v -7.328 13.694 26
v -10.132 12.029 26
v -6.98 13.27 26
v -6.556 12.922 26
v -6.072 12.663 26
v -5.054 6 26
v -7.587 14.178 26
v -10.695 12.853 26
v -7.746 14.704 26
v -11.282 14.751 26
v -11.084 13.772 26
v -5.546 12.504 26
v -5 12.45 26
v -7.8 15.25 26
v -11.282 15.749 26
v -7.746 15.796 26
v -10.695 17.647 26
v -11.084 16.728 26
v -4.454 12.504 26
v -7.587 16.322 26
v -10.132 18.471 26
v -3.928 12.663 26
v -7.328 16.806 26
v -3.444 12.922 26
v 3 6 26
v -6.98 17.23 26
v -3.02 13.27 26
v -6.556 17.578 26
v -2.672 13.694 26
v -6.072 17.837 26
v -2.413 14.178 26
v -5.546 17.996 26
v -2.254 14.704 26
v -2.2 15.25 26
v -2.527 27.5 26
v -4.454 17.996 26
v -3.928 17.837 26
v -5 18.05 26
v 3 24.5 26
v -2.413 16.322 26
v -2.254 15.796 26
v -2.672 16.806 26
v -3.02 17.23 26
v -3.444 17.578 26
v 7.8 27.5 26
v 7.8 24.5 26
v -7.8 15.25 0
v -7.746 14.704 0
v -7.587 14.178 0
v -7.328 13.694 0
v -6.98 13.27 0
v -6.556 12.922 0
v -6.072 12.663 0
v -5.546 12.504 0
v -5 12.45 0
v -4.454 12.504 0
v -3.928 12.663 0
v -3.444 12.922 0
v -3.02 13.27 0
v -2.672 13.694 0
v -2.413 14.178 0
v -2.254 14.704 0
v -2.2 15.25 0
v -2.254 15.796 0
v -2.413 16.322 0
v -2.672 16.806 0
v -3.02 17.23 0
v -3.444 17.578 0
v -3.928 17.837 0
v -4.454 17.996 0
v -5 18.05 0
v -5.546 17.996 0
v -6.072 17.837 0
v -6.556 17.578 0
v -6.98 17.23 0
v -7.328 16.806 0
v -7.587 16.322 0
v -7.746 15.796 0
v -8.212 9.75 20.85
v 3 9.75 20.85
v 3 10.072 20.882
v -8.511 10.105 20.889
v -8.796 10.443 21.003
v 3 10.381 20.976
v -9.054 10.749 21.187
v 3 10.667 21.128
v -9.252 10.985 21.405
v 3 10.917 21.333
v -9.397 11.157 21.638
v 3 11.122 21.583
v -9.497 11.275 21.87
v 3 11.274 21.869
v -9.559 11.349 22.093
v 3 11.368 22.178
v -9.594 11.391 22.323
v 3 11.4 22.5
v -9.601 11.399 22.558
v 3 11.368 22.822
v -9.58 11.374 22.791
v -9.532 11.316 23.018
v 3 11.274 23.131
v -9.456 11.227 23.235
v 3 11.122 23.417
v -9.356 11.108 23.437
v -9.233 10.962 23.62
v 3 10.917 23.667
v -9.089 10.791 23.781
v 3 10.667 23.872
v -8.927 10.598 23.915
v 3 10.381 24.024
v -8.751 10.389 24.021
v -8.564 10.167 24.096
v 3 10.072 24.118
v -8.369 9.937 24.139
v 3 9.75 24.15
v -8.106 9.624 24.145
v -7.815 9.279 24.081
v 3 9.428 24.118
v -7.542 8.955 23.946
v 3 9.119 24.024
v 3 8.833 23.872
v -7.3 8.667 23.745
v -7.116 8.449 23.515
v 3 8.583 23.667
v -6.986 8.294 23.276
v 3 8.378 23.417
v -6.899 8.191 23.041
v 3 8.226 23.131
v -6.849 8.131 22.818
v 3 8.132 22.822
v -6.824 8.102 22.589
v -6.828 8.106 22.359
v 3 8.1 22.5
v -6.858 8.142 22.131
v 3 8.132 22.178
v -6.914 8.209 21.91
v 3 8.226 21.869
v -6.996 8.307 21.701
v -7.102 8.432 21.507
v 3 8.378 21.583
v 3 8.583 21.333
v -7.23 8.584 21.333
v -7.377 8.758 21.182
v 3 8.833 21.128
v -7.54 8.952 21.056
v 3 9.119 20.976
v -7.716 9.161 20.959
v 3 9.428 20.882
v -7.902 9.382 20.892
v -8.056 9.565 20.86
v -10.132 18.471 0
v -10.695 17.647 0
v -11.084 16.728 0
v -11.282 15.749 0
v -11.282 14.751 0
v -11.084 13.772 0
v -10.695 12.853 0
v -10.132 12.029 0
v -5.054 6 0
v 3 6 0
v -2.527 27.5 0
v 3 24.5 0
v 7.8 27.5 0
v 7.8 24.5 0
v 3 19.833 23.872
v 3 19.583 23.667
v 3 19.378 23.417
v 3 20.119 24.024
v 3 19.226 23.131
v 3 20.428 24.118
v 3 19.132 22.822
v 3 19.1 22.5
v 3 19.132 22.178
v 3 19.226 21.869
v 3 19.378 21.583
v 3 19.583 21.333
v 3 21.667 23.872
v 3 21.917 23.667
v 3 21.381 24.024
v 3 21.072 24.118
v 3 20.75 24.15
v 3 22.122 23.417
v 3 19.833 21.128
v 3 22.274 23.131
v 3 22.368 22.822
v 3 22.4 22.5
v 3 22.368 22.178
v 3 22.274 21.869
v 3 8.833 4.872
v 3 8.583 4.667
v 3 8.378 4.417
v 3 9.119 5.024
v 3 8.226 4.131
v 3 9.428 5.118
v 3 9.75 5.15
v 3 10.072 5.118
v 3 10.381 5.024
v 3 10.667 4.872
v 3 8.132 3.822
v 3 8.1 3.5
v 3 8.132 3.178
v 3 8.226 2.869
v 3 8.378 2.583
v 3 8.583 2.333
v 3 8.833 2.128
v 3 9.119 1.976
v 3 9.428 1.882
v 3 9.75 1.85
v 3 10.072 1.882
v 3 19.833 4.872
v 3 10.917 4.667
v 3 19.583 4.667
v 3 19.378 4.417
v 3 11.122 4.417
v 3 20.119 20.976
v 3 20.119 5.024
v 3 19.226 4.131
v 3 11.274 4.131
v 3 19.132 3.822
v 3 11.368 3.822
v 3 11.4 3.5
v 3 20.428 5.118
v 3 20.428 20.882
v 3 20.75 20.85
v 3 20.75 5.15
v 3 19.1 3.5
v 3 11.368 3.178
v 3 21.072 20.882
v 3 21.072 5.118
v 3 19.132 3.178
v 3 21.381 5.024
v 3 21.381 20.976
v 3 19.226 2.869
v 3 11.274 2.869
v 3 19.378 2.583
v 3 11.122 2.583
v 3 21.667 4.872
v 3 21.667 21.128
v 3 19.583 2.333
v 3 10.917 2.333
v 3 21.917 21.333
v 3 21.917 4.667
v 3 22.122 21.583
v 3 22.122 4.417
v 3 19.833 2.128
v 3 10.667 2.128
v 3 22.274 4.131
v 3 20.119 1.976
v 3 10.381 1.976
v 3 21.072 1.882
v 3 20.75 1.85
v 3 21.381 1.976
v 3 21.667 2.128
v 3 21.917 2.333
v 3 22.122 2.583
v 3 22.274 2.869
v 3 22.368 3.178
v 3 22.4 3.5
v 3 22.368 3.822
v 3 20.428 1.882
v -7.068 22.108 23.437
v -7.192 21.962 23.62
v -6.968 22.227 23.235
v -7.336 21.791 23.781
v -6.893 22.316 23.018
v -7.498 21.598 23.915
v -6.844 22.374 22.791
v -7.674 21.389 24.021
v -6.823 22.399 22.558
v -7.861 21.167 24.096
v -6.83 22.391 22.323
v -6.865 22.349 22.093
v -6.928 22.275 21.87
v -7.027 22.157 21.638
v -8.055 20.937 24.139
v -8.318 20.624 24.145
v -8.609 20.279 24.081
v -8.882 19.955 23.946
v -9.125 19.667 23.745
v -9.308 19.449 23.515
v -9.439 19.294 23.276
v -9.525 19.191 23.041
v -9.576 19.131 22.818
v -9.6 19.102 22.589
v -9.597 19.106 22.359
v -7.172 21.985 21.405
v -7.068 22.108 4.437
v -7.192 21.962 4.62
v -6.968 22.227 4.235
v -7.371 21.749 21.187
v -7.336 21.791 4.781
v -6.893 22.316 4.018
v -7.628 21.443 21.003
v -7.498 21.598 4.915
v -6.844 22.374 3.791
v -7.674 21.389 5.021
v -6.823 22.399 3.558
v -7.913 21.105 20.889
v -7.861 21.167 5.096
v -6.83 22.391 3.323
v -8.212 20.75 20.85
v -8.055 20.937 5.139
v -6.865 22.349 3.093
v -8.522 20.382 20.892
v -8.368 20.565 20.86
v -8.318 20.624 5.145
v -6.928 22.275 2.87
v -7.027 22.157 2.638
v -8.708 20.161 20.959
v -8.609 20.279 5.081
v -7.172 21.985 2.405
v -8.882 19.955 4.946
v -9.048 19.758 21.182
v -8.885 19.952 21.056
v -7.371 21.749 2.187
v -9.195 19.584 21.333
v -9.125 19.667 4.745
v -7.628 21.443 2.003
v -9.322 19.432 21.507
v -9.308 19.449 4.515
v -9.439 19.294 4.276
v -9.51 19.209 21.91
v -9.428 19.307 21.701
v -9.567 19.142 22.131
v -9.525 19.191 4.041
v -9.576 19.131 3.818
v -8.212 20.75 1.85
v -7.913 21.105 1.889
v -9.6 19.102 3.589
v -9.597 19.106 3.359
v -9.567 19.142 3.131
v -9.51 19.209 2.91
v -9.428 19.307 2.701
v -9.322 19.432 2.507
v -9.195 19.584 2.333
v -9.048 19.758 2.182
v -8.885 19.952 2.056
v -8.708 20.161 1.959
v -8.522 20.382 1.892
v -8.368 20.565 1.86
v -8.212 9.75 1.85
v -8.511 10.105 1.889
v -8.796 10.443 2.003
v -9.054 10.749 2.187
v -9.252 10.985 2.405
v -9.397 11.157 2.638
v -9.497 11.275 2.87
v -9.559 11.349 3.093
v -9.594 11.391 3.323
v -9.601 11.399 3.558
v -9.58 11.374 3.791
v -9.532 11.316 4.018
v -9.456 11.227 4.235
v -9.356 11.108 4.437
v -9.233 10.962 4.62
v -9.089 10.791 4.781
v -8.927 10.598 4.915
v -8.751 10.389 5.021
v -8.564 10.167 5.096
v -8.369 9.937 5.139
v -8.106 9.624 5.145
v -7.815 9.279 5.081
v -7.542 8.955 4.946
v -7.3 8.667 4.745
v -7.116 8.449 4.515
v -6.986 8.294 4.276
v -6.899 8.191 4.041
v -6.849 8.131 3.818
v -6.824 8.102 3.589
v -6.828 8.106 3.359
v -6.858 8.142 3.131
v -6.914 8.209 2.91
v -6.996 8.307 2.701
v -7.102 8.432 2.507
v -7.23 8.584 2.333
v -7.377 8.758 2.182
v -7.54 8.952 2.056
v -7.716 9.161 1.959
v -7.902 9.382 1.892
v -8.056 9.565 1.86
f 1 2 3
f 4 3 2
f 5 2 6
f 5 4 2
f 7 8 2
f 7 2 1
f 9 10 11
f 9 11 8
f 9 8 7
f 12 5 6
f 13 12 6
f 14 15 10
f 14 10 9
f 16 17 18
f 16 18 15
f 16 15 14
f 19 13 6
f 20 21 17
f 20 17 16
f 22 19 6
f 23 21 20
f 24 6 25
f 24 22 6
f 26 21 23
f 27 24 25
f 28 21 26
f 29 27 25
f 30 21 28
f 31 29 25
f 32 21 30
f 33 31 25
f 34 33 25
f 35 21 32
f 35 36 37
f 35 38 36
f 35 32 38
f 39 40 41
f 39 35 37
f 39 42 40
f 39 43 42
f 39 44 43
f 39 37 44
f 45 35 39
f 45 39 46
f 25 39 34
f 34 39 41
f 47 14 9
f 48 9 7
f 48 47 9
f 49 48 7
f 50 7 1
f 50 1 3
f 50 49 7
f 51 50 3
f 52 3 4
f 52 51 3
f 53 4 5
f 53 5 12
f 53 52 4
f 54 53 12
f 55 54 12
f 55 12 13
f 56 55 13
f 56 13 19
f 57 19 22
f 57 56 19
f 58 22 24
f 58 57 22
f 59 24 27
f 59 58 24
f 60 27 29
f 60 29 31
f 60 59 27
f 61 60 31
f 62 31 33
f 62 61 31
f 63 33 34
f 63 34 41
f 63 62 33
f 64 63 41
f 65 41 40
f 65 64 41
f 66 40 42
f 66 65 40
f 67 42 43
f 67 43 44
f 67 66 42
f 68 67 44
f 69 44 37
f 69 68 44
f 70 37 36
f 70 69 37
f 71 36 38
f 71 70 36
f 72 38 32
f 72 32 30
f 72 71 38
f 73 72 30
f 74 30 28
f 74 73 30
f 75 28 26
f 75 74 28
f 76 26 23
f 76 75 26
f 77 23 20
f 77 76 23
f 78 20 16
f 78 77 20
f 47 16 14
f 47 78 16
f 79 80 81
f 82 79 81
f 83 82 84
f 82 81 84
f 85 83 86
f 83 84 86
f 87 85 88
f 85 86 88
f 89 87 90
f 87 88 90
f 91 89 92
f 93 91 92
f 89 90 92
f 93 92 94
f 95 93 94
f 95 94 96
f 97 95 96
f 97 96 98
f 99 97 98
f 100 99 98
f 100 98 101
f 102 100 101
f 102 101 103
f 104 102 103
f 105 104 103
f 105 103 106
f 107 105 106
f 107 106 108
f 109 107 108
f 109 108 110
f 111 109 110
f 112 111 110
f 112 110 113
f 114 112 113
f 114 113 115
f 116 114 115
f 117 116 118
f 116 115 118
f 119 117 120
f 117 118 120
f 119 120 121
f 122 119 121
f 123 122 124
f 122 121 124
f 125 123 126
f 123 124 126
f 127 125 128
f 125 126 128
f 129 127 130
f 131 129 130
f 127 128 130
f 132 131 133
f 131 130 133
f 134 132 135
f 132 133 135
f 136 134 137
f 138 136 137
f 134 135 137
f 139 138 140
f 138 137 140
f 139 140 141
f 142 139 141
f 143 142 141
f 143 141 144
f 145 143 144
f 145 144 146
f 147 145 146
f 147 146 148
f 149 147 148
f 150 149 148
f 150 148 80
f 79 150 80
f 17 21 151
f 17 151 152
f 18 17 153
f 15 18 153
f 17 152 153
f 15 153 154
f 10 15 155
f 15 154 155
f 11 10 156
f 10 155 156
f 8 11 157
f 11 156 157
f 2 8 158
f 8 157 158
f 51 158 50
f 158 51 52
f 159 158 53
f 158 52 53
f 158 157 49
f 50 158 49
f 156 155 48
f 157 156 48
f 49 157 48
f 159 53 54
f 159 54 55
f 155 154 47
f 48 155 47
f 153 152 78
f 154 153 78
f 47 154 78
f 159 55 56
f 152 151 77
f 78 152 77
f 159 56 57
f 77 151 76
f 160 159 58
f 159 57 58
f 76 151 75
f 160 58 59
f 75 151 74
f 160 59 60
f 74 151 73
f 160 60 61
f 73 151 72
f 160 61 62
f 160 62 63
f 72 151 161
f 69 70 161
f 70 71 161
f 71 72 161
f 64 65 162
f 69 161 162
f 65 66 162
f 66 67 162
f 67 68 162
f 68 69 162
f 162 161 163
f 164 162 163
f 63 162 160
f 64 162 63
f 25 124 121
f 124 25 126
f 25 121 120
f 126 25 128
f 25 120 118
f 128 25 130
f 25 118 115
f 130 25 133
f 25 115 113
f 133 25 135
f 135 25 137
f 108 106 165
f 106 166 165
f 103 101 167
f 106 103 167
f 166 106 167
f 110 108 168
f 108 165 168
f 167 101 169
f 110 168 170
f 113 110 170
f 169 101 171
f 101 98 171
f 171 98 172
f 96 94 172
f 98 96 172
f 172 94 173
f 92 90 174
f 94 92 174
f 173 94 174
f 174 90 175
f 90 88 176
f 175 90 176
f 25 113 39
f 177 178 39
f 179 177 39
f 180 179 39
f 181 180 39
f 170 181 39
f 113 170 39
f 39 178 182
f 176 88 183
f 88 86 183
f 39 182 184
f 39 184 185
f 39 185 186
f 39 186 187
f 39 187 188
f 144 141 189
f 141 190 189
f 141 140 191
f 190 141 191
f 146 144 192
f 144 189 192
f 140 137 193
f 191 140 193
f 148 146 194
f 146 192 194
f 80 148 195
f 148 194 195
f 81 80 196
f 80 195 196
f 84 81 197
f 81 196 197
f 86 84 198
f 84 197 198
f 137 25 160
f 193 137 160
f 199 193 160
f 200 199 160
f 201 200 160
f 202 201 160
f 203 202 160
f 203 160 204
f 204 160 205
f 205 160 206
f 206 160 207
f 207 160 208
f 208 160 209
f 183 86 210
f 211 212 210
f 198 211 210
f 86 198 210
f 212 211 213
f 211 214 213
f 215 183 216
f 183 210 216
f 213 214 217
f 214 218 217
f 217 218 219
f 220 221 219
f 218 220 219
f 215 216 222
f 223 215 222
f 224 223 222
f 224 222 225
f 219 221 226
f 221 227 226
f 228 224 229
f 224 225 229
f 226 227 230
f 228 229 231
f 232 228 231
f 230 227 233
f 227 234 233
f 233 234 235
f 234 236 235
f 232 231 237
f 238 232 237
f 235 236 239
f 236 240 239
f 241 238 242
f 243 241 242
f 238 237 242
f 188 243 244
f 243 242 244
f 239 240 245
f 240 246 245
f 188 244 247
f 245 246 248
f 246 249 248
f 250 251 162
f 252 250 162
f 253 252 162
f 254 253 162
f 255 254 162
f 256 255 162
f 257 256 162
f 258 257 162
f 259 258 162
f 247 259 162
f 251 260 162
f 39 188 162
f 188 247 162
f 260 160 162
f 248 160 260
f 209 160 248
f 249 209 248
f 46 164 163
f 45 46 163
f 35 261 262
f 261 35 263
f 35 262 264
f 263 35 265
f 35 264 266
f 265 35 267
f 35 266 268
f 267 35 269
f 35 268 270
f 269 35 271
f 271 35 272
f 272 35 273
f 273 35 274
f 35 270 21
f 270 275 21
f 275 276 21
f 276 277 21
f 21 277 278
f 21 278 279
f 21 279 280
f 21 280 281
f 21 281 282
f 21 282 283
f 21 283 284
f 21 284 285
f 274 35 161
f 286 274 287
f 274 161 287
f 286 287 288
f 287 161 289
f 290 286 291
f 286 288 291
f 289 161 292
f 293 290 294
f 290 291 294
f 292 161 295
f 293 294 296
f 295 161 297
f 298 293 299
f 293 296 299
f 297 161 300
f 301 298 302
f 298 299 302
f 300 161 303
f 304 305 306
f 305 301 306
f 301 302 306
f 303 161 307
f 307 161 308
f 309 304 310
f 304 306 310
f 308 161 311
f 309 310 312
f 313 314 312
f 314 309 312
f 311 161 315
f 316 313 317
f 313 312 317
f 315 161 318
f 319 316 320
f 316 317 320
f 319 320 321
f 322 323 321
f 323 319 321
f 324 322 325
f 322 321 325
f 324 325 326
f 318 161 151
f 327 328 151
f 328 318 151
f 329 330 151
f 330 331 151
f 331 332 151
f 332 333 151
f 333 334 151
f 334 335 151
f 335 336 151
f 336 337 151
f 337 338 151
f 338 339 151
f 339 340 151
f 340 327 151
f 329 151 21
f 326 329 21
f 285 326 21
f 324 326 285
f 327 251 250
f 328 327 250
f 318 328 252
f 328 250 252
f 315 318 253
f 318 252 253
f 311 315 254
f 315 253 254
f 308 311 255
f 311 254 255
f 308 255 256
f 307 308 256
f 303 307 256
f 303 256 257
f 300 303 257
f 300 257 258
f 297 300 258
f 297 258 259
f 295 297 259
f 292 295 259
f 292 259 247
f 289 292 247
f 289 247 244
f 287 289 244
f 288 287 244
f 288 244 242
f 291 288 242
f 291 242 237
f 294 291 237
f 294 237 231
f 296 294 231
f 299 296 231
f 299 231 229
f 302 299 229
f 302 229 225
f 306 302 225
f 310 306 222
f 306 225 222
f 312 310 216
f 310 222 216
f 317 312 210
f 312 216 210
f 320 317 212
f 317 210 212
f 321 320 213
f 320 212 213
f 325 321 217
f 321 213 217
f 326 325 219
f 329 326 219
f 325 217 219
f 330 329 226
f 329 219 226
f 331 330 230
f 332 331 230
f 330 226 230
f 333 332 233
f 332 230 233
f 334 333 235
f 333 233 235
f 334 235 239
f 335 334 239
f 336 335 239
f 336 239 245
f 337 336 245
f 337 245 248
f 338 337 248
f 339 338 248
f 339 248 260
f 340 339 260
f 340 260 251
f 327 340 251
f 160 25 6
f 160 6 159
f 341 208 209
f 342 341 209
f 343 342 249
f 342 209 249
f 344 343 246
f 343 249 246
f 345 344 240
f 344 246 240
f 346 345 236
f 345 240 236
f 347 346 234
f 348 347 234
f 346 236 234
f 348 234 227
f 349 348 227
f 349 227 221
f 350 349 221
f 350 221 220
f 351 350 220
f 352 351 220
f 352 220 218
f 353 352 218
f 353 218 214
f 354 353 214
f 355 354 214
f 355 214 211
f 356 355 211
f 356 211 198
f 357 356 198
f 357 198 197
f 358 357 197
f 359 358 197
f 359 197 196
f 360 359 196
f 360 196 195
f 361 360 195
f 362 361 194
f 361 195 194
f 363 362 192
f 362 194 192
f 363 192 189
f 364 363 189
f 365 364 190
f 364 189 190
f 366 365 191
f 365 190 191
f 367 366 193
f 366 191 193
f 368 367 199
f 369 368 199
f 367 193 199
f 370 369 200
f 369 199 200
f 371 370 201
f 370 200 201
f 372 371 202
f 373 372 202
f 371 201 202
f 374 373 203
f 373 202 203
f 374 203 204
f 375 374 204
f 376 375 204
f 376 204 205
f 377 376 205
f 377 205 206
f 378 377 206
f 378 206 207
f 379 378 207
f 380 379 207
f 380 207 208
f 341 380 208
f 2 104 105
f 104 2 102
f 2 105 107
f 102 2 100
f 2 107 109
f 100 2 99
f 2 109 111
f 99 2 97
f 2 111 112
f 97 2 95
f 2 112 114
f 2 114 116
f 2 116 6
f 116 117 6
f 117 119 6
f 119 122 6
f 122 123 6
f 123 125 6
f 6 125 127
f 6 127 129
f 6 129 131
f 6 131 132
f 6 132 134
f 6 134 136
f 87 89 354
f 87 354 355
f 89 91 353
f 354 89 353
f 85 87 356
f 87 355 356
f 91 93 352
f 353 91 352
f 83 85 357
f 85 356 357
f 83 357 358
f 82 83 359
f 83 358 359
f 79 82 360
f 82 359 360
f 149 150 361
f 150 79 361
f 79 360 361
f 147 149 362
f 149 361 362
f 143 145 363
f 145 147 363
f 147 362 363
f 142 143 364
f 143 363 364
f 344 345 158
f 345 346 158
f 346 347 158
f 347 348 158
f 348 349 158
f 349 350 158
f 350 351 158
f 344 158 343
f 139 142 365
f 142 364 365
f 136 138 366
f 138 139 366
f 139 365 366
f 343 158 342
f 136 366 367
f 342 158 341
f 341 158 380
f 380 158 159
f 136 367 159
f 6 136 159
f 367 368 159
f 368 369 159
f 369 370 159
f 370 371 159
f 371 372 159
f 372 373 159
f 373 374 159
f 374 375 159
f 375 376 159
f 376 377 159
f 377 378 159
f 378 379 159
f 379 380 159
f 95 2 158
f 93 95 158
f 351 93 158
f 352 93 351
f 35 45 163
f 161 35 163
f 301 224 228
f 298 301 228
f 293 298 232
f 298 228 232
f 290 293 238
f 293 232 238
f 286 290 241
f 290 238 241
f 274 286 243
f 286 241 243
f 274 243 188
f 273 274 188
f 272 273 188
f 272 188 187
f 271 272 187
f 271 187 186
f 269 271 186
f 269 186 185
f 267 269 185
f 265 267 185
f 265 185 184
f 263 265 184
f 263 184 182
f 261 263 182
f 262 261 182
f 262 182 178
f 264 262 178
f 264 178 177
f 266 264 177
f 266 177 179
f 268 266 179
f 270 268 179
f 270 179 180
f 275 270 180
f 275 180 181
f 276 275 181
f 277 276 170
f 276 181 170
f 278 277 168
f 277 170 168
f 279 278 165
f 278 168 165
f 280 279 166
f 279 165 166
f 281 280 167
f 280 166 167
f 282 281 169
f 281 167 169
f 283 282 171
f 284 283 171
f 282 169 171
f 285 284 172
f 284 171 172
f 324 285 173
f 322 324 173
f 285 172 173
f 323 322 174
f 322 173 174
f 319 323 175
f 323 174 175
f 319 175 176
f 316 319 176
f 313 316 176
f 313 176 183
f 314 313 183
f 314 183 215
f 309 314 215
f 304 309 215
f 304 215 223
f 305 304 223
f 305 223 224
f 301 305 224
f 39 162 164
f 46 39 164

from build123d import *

# Parameters (mm, degrees)
SKETCH_1_R             = 2.8
EXTRUDE_1_DEPTH        = 26
SKETCH_2_R             = 1.65
CUT_EXTRUDE_2_DEPTH    = 43.555295324
CUT_EXTRUDE_2120_REACH = 46.4
SKETCH_4_W             = 26
SKETCH_4_H             = 3
CUT_EXTRUDE_3_REACH    = 44.395
SKETCH_7_W             = 26
SKETCH_7_H             = 3


with BuildPart() as part:
    # 草图1 → 凸台-拉伸1 (new body)
    with BuildSketch(Plane.XY):
        with BuildLine():
            Line((3, 6), (3, 24.5))
            Line((3, 24.5), (7.8, 24.5))
            Line((7.8, 24.5), (7.8, 30.5))
            Line((7.8, 30.5), (0, 30.5))
            Line((0, 30.5), (-10.13168569, 18.471060485))
            ThreePointArc((-10.13168569, 18.471060485), (-11.307451211, 15.25), (-10.13168569, 12.028939515))
            Line((-10.13168569, 12.028939515), (0, 0))
            Line((0, 0), (7.8, 0))
            Line((7.8, 0), (7.8, 6))
            Line((7.8, 6), (3, 6))
        make_face()
        with Locations(Location((-5, 15.25, 0), (0, 0, 180))):
            Circle(SKETCH_1_R, mode=Mode.SUBTRACT)
    extrude(amount=EXTRUDE_1_DEPTH)

    # 草图2 → 切除-拉伸2 (cut, through all)
    with BuildSketch(Plane(origin=(3, 0, 0), x_dir=(0, 0, -1), z_dir=(1, 0, 0))):
        with Locations((-3.5, 20.75)):
            Circle(SKETCH_2_R)
        with Locations((-22.5, 9.75)):
            Circle(SKETCH_2_R)
        with Locations((-22.5, 20.75)):
            Circle(SKETCH_2_R)
        with Locations((-3.5, 9.75)):
            Circle(SKETCH_2_R)
    extrude(amount=-CUT_EXTRUDE_2_DEPTH, mode=Mode.SUBTRACT)

    # 草图4 → Cut-Extrude 2120 (cut, up to next)
    with BuildSketch(Plane(origin=(7.8, 0, 0), x_dir=(0, 0, -1), z_dir=(1, 0, 0)), mode=Mode.PRIVATE) as cut_extrude_2120_sk1:
        with Locations((-13, 29)):
            Rectangle(SKETCH_4_W, SKETCH_4_H)
    cut_extrude_2120_tool1 = extrude(cut_extrude_2120_sk1.sketch, amount=-CUT_EXTRUDE_2120_REACH, mode=Mode.PRIVATE) & part.part
    # 草图4 → Cut-Extrude 2120 (cut, up to next)
    with BuildSketch(Plane(origin=(7.8, 0, 0), x_dir=(0, 0, -1), z_dir=(1, 0, 0)), mode=Mode.PRIVATE) as cut_extrude_2120_sk2:
        with Locations((-13, 1.5)):
            Rectangle(SKETCH_4_W, SKETCH_4_H)
    cut_extrude_2120_tool2 = extrude(cut_extrude_2120_sk2.sketch, amount=-CUT_EXTRUDE_2120_REACH, mode=Mode.PRIVATE) & part.part
    add(cut_extrude_2120_tool1.solids().sort_by_distance((7.8, 29, 13))[0], mode=Mode.SUBTRACT)
    add(cut_extrude_2120_tool2.solids().sort_by_distance((7.8, 1.5, 13))[0], mode=Mode.SUBTRACT)

    # 切除-拉伸3: up to this plane
    cut_extrude_3_end = Plane(origin=(0, 0, 26), z_dir=(0.7648468958435873, 0.6442120969978977, 0))
    # 草图7 → 切除-拉伸3 (cut, up to the surface)
    with BuildSketch(Plane(origin=(7.8, 0, 0), x_dir=(0, 0, -1), z_dir=(1, 0, 0)), mode=Mode.PRIVATE) as cut_extrude_3_sk1:
        with Locations((-13, 4.5)):
            Rectangle(SKETCH_7_W, SKETCH_7_H)
    cut_extrude_3_tool1 = split(extrude(cut_extrude_3_sk1.sketch, amount=-CUT_EXTRUDE_3_REACH, mode=Mode.PRIVATE), bisect_by=cut_extrude_3_end, keep=Keep.BOTH, mode=Mode.PRIVATE)
    add(cut_extrude_3_tool1.solids().sort_by_distance((7.8, 4.5, 13))[0], mode=Mode.SUBTRACT)


solid = part.part
